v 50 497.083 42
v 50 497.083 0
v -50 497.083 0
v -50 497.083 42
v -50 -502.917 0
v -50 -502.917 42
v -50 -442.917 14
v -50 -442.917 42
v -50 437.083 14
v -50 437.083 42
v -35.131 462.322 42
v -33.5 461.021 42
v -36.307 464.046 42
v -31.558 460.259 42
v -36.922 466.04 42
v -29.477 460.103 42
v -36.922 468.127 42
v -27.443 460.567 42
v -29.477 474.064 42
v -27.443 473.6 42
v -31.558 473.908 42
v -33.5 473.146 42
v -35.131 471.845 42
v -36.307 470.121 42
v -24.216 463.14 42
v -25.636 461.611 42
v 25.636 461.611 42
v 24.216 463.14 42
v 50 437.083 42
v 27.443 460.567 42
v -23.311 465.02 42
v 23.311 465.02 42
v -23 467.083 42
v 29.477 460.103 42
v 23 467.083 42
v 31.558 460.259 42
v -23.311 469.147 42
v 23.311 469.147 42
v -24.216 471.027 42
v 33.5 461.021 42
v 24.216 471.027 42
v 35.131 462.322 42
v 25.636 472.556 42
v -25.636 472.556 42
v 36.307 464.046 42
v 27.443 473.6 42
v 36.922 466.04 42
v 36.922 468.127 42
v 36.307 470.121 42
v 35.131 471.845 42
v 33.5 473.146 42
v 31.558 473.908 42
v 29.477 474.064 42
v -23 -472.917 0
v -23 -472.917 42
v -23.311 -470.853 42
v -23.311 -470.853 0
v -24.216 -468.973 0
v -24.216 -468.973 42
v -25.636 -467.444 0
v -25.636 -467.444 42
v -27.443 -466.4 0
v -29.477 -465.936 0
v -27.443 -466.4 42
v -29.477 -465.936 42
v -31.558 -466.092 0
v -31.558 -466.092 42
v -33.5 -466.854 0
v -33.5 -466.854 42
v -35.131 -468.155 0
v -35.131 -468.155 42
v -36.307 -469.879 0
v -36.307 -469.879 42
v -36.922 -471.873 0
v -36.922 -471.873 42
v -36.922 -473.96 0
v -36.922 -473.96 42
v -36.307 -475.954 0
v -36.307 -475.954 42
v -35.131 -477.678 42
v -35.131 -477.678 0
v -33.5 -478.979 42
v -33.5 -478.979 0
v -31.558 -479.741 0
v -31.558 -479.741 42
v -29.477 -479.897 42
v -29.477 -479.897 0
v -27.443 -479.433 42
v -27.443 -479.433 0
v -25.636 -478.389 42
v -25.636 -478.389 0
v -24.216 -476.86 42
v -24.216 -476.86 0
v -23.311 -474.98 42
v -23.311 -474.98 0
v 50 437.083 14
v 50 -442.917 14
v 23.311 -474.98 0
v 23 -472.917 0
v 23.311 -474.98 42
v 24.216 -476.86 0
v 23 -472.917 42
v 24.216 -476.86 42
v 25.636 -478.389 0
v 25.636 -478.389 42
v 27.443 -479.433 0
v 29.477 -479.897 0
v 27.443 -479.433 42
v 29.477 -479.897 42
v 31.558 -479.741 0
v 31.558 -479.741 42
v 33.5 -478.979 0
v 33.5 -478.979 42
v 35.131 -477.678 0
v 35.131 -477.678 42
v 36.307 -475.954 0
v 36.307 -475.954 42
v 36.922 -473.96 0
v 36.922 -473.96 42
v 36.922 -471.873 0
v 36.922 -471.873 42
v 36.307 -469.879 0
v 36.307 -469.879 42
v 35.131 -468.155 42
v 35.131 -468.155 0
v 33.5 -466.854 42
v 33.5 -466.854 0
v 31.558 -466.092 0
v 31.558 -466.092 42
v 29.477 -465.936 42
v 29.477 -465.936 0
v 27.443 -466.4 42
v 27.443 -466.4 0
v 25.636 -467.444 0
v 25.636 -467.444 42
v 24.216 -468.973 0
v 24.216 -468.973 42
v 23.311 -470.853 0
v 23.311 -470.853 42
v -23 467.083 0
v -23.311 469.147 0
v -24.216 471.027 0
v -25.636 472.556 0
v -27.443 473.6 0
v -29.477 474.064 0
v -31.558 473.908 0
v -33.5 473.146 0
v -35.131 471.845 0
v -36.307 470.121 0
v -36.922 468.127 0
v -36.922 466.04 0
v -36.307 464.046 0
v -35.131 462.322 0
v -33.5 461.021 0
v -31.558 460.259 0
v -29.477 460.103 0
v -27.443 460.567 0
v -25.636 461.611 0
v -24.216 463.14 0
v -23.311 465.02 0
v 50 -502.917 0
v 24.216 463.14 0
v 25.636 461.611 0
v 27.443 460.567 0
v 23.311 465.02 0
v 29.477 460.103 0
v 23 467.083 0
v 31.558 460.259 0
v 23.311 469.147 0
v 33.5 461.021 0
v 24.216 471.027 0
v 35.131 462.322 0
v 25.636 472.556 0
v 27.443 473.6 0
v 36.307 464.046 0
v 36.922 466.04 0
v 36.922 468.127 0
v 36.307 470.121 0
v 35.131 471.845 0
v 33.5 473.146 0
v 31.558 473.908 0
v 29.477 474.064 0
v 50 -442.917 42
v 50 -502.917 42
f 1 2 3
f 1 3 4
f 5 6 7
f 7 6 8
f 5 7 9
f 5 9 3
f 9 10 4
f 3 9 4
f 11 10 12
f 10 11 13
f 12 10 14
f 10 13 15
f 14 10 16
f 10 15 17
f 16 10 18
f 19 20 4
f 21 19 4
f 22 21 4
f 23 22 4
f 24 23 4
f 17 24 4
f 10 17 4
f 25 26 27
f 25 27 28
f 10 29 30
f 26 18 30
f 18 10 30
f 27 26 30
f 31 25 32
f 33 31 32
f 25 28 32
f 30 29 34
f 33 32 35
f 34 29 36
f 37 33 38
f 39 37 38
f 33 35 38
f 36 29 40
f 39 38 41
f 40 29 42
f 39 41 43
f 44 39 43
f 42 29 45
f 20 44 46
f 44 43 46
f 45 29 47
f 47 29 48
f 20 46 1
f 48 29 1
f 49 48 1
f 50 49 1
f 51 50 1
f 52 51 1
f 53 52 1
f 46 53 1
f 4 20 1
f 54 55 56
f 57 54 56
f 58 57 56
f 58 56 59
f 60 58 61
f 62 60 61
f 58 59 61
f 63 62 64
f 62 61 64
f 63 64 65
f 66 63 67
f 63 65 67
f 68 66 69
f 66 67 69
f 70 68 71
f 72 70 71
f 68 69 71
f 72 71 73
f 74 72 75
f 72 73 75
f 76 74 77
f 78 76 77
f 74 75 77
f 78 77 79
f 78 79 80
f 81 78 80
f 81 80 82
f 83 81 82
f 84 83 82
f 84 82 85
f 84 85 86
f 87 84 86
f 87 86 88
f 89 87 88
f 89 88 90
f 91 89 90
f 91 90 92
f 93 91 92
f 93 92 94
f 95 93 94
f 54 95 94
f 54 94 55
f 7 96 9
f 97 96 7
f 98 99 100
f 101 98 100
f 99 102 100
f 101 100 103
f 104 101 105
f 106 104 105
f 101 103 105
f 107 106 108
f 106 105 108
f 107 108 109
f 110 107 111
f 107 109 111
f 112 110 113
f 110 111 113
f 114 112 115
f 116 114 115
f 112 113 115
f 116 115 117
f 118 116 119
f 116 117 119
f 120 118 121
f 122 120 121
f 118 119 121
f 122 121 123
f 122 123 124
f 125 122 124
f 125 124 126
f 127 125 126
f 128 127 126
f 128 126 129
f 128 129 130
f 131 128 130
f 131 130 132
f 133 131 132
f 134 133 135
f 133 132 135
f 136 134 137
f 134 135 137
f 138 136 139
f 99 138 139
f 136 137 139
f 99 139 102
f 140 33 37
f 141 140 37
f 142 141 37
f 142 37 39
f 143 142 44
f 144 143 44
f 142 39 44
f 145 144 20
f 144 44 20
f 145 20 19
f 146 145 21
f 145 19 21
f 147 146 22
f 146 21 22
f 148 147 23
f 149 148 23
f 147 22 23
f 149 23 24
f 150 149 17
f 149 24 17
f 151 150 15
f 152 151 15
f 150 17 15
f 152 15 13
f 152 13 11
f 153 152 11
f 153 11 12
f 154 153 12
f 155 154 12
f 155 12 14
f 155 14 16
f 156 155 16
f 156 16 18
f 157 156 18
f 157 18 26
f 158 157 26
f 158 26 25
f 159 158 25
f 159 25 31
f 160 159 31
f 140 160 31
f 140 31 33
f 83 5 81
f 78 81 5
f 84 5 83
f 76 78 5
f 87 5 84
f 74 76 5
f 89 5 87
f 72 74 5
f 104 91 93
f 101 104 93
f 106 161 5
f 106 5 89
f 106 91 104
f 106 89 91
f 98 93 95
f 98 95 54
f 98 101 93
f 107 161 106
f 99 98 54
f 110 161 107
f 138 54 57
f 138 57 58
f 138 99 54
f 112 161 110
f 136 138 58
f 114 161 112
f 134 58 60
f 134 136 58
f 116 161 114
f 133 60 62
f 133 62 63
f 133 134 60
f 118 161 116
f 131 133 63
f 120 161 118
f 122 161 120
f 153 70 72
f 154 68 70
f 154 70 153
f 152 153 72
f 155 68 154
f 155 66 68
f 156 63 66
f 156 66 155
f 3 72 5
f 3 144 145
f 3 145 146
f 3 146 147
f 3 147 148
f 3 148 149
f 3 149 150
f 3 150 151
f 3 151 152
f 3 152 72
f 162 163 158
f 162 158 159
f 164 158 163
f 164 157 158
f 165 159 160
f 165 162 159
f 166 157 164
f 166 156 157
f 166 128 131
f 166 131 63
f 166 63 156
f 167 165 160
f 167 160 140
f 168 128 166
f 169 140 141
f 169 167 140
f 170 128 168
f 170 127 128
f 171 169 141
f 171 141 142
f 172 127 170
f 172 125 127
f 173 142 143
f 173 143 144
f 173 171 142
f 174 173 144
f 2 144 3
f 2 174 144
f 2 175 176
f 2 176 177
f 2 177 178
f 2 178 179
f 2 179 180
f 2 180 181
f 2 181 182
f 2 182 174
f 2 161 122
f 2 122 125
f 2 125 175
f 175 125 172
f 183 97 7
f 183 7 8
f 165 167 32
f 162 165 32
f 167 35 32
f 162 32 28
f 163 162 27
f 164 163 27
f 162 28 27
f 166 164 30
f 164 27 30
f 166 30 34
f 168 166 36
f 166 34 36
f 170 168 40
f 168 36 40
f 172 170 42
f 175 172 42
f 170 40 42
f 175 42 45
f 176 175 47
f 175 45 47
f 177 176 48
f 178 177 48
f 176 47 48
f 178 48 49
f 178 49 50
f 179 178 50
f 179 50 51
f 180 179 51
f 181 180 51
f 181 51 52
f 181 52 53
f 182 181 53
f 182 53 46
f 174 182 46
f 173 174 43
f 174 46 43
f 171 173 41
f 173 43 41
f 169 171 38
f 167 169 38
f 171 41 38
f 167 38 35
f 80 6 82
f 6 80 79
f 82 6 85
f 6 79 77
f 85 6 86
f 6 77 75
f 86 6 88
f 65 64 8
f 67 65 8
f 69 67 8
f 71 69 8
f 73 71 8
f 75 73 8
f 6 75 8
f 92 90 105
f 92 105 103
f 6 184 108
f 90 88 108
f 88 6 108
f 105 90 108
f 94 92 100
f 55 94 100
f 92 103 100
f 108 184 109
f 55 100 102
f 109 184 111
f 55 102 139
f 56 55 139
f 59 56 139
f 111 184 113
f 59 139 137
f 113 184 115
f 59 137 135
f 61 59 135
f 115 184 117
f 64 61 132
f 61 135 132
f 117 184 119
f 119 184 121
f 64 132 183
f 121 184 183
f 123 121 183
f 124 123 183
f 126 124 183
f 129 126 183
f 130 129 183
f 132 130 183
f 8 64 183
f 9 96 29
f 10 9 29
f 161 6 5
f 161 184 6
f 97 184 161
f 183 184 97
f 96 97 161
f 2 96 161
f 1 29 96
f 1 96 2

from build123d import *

# Parameters (mm, degrees)
F0_W     = 60
F0_H     = 28
F1_DEPTH = 50
F2_R     = 7
F3_DEPTH = 50
F4_R     = 7
F5_DEPTH = 50


with BuildPart() as f1:
    # F0 (on Right) → F1 (new body, symmetric)
    with BuildSketch(Plane.YZ):
        Polygon((-502.916585, 14), (-502.916585, 0), (497.083415, 0), (497.083415, 14), (437.083415, 14), (-442.916585, 14), align=None)
        with Locations((-472.916585, 28)):
            Rectangle(F0_W, F0_H)
        with Locations((467.083415, 28)):
            Rectangle(F0_W, F0_H)
    extrude(amount=F1_DEPTH, both=True)

    # F2 (on face) → F3 (cut, symmetric)
    with BuildSketch(Plane.XY.offset(42)):
        with Locations((-30, -472.916585)):
            Circle(F2_R)
        with BuildLine():
            ThreePointArc((37, -472.916585), (30, -465.916585), (23, -472.916585))
            ThreePointArc((23, -472.916585), (30, -479.916585), (37, -472.916585))
        make_face()
    extrude(amount=F3_DEPTH, both=True, mode=Mode.SUBTRACT)

    # F4 (on face) → F5 (cut, symmetric)
    with BuildSketch(Plane.XY.offset(42)):
        with Locations((-30, 467.083415)):
            Circle(F4_R)
        with BuildLine():
            ThreePointArc((37, 467.083415), (30, 474.083415), (23, 467.083415))
            ThreePointArc((23, 467.083415), (30, 460.083415), (37, 467.083415))
        make_face()
    extrude(amount=F5_DEPTH, both=True, mode=Mode.SUBTRACT)


solid = f1.part
